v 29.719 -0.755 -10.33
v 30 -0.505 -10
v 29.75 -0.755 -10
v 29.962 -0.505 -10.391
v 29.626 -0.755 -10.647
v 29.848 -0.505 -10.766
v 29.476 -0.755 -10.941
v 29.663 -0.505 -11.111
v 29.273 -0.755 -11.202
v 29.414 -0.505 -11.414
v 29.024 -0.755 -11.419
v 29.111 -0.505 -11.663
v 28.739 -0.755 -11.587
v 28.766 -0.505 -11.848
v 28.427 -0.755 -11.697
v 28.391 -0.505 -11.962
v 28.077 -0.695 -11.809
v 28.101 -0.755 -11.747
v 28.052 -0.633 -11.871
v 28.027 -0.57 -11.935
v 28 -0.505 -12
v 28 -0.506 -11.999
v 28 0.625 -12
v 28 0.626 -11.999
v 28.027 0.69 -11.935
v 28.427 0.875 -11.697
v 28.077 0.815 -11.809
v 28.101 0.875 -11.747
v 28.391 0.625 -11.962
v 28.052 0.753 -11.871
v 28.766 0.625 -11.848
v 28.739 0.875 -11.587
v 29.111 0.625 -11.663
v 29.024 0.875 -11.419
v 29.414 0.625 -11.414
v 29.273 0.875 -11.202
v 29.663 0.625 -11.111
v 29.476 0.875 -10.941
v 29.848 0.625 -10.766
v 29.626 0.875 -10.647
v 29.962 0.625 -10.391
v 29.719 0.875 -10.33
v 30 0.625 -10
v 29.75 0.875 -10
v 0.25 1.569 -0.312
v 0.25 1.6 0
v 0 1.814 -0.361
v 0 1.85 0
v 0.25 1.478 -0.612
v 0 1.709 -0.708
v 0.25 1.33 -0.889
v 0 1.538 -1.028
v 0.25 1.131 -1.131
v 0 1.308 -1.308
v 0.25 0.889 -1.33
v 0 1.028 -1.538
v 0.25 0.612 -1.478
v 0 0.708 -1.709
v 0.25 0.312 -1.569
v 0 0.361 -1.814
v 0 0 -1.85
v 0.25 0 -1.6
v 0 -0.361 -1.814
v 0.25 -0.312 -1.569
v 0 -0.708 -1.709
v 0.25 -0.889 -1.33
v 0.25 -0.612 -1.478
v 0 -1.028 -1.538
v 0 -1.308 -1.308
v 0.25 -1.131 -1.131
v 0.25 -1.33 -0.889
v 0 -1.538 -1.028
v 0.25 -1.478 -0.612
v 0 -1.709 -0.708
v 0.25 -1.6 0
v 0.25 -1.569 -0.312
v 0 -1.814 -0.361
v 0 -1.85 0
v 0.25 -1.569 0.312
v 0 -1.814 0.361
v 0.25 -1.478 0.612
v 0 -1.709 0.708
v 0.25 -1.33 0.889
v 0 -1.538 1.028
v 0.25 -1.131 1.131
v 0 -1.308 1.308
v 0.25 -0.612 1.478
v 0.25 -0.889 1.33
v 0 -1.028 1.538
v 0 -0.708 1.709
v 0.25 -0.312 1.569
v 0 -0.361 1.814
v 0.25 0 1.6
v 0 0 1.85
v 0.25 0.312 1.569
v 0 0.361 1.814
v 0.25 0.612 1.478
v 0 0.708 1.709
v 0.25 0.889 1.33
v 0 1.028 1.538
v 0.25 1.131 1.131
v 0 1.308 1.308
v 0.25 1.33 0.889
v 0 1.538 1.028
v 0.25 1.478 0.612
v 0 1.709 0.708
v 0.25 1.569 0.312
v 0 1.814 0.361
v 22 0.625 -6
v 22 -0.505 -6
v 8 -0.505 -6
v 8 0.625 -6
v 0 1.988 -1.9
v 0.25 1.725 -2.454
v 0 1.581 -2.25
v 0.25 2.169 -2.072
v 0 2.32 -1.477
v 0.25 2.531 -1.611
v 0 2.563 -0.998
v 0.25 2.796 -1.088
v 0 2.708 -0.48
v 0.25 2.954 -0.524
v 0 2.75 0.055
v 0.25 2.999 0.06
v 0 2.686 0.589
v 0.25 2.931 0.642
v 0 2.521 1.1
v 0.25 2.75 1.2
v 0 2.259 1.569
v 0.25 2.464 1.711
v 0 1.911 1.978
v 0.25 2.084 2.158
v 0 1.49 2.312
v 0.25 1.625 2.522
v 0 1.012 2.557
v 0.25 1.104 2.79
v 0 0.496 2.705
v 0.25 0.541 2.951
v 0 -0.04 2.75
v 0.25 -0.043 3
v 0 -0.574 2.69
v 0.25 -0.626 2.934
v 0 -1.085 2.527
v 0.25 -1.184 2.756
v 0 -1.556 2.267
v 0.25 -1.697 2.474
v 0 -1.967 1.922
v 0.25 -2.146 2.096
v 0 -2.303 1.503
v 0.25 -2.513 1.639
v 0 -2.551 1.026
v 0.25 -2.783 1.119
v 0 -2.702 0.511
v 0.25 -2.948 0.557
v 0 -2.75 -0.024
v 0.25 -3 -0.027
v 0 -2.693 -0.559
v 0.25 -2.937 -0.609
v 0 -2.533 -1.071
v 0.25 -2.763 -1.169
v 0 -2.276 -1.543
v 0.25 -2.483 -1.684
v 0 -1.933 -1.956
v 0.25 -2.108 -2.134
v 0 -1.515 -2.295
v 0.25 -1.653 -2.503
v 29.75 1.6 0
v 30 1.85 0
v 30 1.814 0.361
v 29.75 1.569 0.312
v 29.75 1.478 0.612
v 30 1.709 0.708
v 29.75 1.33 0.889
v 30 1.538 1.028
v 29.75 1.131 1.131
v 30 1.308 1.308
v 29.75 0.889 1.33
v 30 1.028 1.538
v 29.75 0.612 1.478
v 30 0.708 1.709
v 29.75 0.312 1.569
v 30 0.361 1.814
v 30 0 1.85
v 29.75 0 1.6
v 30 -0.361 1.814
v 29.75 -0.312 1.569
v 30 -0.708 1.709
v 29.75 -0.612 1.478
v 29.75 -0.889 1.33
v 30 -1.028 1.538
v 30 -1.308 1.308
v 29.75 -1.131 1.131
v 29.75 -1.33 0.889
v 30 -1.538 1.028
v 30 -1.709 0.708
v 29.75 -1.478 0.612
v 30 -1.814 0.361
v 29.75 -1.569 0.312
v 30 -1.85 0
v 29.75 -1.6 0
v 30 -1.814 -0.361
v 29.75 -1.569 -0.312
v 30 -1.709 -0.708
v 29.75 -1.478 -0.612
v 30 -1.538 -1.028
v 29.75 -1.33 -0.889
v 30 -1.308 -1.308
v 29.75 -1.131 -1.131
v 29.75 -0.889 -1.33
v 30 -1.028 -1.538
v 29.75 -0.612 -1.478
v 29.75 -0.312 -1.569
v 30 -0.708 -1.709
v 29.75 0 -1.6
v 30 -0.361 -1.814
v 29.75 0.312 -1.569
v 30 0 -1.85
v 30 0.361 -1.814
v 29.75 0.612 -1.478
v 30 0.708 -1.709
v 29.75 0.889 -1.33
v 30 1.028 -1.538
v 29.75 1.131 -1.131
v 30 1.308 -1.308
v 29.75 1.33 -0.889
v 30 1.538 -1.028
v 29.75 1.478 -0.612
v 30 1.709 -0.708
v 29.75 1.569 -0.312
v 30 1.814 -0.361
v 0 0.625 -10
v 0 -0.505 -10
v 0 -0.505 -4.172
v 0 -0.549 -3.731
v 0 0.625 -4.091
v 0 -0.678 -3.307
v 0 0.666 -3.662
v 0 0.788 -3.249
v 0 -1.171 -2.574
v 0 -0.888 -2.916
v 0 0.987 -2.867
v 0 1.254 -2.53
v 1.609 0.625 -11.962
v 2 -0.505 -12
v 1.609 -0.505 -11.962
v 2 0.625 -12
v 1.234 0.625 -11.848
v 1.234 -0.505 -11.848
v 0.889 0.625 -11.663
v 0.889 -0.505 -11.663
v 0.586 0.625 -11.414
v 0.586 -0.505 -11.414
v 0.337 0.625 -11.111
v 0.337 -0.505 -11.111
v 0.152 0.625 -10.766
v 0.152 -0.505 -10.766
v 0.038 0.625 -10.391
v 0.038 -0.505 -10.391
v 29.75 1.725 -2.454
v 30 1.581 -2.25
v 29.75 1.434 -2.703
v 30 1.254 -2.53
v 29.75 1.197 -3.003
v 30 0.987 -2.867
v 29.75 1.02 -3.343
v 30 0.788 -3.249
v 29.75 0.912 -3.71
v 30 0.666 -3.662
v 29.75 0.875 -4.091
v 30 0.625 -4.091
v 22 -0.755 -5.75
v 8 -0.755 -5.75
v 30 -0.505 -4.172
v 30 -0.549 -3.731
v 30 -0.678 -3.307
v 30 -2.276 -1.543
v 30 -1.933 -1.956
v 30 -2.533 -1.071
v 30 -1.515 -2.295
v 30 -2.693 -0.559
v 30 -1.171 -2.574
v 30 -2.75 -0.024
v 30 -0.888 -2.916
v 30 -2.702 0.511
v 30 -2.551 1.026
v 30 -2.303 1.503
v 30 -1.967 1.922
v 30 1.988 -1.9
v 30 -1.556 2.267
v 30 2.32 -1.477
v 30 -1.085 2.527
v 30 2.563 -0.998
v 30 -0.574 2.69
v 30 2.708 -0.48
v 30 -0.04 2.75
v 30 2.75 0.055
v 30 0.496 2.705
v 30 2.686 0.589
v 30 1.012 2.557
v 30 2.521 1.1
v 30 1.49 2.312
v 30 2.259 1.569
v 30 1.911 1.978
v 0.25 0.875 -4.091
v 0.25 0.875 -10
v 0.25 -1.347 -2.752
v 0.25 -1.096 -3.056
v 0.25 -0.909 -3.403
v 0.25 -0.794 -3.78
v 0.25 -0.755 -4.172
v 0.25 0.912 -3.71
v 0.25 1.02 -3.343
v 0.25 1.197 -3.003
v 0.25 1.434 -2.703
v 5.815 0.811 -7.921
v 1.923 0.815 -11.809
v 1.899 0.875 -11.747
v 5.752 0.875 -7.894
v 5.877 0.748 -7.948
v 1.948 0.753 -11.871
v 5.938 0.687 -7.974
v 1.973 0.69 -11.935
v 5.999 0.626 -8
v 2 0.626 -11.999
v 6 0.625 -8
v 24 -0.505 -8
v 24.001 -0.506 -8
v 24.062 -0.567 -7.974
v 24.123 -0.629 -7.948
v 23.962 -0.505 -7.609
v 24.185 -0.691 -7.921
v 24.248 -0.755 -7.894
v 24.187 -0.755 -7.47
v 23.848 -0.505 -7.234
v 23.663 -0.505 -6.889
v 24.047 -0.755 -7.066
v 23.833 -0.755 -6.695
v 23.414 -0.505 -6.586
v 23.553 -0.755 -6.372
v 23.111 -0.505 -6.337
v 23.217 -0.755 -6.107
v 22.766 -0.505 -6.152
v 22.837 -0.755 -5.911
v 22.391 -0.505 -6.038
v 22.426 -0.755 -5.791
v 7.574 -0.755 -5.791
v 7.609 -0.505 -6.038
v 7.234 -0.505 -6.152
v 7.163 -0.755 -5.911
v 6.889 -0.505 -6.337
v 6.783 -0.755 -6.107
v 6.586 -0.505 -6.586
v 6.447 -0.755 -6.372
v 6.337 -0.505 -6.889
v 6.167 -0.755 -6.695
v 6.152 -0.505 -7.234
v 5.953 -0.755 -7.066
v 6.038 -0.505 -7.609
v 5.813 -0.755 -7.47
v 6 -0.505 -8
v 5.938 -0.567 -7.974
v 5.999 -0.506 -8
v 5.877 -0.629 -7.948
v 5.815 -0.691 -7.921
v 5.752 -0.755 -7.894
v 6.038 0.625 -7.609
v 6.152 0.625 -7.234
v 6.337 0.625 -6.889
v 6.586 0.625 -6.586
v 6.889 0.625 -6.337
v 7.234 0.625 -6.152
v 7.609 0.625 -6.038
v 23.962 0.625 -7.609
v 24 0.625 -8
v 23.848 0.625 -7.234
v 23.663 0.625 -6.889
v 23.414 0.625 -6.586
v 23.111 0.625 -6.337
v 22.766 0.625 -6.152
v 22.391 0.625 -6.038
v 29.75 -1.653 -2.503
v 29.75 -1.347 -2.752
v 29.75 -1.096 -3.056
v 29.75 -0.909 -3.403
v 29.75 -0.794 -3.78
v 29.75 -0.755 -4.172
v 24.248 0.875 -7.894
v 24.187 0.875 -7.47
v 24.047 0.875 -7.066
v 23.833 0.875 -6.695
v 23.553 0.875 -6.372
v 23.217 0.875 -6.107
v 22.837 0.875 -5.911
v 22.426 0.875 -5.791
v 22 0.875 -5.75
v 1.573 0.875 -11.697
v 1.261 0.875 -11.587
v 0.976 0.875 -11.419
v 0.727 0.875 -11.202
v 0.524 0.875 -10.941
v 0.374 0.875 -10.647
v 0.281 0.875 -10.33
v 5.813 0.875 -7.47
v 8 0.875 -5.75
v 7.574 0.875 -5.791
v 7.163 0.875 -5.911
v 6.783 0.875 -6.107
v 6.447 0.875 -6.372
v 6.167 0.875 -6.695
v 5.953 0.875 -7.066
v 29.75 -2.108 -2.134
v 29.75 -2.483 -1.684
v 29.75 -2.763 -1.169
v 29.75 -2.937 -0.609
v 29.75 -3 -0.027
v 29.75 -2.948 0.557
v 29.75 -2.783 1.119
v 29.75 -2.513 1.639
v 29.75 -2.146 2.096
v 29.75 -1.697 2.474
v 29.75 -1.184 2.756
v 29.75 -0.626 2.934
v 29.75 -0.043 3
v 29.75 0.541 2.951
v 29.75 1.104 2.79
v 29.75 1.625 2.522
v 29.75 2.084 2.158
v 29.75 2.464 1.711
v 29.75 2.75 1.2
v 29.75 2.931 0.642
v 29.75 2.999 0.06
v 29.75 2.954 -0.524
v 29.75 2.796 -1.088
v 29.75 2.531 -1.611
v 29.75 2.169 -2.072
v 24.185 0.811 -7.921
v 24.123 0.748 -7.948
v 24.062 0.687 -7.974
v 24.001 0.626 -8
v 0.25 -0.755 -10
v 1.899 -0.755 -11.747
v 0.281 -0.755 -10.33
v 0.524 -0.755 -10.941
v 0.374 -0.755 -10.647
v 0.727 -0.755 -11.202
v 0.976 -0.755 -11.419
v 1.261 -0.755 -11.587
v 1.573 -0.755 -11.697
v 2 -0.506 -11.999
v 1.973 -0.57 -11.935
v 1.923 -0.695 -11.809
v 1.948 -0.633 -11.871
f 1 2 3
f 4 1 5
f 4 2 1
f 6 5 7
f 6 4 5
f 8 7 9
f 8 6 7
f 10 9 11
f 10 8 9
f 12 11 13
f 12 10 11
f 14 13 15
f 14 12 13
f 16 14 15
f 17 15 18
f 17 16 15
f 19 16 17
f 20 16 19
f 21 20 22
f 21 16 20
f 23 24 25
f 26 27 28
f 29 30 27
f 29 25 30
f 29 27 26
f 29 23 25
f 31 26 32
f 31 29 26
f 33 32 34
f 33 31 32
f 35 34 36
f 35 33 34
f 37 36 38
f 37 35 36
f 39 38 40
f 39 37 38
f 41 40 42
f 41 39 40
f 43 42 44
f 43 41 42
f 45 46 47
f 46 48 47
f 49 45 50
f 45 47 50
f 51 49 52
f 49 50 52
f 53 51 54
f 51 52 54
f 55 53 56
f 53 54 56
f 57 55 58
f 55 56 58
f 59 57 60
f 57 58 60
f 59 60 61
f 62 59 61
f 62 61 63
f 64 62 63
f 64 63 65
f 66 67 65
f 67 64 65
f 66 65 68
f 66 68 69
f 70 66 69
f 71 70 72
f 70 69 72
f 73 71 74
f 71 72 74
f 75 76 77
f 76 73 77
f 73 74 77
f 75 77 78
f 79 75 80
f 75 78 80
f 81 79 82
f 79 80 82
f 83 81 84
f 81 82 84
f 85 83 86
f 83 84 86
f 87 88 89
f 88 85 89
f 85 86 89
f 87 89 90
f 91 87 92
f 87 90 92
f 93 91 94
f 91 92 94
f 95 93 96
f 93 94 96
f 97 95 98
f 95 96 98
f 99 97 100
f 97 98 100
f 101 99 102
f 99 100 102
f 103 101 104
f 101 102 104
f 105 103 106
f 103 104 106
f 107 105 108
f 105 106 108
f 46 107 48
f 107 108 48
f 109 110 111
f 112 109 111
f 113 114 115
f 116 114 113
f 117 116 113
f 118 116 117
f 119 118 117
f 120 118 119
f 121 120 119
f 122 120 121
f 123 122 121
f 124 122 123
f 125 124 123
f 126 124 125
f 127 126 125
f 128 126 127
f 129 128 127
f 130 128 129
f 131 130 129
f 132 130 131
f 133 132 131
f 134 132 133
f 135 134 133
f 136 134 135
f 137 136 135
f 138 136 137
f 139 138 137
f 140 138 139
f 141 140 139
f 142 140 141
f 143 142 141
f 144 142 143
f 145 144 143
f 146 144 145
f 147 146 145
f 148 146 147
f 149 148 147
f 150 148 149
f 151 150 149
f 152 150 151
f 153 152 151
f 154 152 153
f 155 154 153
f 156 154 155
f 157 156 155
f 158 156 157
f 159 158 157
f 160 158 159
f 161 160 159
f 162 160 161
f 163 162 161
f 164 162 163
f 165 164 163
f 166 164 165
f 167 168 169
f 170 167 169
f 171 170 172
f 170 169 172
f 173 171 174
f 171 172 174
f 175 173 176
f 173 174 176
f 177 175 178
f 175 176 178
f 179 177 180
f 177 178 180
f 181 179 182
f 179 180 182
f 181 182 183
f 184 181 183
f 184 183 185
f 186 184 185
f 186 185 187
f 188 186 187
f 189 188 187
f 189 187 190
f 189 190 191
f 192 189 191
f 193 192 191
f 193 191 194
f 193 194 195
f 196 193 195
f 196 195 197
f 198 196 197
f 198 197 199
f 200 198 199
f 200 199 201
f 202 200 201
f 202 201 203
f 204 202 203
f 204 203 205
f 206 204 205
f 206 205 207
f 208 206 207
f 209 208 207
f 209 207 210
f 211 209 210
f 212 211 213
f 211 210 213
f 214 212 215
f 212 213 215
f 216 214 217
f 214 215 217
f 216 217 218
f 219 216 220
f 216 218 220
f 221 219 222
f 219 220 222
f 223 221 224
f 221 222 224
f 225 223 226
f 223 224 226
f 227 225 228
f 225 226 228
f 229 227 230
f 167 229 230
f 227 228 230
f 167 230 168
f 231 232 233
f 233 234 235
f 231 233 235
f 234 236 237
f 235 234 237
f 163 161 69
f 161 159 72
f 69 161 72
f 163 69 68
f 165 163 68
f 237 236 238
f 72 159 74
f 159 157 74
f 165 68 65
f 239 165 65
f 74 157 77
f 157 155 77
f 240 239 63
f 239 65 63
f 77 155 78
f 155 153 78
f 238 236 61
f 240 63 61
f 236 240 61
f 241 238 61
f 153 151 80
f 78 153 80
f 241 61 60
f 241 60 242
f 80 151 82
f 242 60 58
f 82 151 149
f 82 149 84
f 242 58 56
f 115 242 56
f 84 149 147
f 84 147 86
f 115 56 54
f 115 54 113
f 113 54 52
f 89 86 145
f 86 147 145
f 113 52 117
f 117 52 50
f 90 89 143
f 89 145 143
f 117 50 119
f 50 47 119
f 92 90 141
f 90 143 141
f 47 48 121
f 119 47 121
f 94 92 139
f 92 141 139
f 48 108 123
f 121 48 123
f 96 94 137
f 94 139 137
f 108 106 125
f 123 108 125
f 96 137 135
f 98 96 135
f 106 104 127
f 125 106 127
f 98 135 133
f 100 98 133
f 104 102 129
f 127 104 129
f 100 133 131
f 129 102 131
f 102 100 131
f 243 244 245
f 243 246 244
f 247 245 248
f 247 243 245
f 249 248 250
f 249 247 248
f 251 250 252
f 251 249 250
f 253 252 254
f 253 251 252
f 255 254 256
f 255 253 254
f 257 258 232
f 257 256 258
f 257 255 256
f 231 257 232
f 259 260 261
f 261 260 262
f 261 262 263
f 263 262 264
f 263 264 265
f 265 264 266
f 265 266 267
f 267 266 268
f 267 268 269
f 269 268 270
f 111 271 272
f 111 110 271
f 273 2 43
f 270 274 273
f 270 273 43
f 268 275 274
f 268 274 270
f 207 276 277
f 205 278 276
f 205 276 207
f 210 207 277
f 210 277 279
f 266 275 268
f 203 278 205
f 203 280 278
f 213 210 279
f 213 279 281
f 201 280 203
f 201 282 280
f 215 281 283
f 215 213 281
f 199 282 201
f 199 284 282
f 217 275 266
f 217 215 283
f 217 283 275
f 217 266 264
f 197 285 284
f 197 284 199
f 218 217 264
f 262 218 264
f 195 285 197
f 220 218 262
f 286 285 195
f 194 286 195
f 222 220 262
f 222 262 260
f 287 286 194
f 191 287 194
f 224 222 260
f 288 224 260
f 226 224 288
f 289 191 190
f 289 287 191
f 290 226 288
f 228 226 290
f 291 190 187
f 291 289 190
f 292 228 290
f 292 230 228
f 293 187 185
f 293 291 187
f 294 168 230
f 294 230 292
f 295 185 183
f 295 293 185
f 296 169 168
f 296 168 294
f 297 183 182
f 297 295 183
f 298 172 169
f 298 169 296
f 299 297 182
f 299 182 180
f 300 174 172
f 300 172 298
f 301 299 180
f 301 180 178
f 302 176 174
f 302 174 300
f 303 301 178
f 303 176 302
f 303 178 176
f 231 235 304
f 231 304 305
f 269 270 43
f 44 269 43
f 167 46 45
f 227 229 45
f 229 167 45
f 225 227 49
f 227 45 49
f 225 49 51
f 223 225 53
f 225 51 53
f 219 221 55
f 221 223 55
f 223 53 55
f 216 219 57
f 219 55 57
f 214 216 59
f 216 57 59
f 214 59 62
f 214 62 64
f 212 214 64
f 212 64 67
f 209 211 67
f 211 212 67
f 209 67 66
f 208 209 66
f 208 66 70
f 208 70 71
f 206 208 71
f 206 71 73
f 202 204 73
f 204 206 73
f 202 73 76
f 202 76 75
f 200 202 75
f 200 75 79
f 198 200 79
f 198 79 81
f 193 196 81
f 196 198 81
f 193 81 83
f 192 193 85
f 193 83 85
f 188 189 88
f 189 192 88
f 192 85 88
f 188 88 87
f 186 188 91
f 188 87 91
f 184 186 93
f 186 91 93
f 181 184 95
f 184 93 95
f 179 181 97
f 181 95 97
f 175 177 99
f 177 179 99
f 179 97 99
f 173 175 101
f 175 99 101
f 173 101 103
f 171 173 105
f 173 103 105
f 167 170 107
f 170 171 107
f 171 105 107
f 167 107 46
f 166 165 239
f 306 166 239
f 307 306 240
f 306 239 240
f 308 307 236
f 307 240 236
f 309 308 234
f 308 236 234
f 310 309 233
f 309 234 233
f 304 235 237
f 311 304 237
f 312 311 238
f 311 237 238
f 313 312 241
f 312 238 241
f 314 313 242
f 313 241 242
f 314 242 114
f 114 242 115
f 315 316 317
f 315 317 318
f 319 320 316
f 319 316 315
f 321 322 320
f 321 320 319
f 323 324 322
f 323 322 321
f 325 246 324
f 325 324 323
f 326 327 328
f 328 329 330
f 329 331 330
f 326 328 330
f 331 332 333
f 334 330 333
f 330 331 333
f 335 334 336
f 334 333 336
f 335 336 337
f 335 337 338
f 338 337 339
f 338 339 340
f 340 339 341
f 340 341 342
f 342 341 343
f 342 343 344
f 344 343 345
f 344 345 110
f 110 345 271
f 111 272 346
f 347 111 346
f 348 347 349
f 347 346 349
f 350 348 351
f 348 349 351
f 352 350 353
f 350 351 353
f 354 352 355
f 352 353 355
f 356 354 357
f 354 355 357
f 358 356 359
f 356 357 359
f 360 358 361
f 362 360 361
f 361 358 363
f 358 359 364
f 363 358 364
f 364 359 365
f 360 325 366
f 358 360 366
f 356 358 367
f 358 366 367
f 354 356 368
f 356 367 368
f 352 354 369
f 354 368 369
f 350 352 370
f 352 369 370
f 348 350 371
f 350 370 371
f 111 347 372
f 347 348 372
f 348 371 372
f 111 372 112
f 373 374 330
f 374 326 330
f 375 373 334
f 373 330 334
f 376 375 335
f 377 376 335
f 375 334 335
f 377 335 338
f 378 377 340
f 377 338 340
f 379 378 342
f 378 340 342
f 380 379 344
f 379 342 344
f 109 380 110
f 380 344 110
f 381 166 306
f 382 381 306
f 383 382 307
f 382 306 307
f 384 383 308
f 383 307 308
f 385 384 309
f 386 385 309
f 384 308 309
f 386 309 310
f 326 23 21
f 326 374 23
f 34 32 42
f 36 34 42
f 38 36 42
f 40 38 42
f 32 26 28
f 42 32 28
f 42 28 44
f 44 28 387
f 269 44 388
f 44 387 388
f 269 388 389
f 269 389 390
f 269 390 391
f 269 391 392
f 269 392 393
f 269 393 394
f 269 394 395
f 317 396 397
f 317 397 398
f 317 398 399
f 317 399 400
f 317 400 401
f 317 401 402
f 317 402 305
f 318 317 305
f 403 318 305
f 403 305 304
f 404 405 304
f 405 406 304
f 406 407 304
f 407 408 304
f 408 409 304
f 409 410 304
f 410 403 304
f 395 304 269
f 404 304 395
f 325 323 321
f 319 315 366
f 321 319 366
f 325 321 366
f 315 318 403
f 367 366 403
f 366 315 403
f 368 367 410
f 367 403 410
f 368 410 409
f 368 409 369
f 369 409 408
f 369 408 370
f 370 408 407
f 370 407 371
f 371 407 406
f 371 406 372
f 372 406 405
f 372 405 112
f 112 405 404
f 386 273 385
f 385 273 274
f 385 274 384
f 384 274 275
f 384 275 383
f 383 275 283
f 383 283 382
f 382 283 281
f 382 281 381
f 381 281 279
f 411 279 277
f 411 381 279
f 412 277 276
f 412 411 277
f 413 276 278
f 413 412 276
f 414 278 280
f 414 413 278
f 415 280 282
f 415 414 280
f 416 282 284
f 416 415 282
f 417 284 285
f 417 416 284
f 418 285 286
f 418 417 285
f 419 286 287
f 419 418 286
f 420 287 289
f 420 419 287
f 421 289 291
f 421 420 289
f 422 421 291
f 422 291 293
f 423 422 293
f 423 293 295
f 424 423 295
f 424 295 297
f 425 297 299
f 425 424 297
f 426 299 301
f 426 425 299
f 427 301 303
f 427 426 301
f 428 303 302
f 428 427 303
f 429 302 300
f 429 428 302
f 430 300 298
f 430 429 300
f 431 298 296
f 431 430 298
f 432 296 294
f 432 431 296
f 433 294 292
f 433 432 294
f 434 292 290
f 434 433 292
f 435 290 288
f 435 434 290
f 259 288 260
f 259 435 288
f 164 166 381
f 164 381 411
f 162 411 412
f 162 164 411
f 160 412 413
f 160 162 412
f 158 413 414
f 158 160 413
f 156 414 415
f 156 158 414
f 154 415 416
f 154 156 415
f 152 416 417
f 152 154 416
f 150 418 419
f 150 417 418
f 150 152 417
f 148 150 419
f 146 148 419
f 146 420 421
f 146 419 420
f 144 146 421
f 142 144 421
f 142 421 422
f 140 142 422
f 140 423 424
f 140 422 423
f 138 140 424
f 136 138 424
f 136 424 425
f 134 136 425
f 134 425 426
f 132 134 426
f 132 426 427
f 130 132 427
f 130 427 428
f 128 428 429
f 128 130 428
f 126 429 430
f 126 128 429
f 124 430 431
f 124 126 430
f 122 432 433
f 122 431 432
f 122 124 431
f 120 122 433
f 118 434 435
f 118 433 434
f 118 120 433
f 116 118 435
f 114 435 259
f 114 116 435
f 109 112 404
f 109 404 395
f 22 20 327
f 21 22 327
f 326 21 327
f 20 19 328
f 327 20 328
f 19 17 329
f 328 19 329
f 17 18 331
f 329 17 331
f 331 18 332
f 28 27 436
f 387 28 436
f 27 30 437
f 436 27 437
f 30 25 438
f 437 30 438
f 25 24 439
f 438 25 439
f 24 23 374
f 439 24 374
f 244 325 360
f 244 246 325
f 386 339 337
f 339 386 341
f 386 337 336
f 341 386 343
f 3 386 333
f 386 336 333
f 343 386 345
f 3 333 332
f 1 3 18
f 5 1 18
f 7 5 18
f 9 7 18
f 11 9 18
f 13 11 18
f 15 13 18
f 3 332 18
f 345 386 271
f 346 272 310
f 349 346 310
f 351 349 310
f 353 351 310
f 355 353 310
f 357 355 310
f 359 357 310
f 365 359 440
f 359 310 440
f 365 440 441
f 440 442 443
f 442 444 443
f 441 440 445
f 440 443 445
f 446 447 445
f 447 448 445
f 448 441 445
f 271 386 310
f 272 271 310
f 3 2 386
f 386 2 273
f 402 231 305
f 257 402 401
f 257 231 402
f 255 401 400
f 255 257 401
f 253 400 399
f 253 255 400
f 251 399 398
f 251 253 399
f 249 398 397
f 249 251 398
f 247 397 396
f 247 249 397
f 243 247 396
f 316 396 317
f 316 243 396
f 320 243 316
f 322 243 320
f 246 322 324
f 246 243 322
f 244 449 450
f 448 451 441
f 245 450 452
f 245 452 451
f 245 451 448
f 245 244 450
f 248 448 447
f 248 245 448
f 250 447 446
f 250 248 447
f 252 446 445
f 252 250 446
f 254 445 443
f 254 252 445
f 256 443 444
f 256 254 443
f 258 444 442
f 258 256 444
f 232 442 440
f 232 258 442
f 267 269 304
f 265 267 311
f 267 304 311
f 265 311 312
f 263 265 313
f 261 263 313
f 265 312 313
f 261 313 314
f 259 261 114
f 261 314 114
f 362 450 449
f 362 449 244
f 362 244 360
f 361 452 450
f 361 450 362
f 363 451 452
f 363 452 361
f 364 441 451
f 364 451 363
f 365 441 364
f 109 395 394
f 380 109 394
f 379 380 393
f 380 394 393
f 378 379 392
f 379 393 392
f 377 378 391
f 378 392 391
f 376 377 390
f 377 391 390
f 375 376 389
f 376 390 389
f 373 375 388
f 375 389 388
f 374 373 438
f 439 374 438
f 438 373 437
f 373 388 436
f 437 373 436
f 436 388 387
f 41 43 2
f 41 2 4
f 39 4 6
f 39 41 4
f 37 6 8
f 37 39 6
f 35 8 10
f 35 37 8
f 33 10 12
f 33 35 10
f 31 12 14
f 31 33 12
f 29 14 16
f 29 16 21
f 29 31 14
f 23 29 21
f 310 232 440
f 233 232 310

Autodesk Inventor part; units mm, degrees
ref_plane "YZ Plane" through (0, 0, 0) normal (1, 0, 0) x (0, 1, 0)
ref_plane "XZ Plane" through (0, 0, 0) normal (0, 1, 0) x (-1, 0, 0)
ref_plane "XY Plane" through (0, 0, 0) normal (0, 0, 1) x (1, 0, 0)
sketch "Sketch3" plane through (0, 0, 0) normal (1, 0, 0) x (0, 1, 0)
  circle A0 centre (0, 0) radius 1.6
  arc A1 (1.725, -2.4545) -> (-1.6531, -2.5034) centre (0, 0) ccw
  line L0 (-0.7552, -4.1724) -> (-0.7552, -12)
  line L1 (-0.7552, -12) -> (0.875, -12)
  line L2 (0.875, -12) -> (0.875, -4.0908)
  arc A2 (1.725, -2.4545) -> (0.875, -4.0908) centre (2.875, -4.0908) ccw
  arc A3 (-0.7552, -4.1724) -> (-1.6531, -2.5034) centre (-2.7552, -4.1724) ccw
  dimension "d4" = 3.2
  dimension "d5" = 6
  dimension "d7" = 2
  dimension "d33" = 12
extrude "Extrusion2" add sketch "Sketch3" along normal blind 30
sketch "Sketch5" plane through (0, 0.875, -4.0908) normal (0, 1, 0) x (1, 0, 0)
  line L0 (0, 7.9092) -> (30, 7.9092) projected
  line L1 (6, 7.9092) -> (24, 7.9092)
  line L2 (24, 7.9092) -> (24, 1.9092)
  line L3 (24, 1.9092) -> (6, 1.9092)
  line L4 (6, 1.9092) -> (6, 7.9092)
  line L5 (0, 7.9092) -> (0, 0) projected
  point P0 (0, -4.0908)
  dimension "d18" = 6
  dimension "d19" = 30
  dimension "d20" = 6
  dimension "d21" = 18
extrude "Extrusion3" cut sketch "Sketch5" along normal blind 0.5 and the other way blind 2
chamfer "Chamfer3" distance 4 angle 45 2 edges at (6, 0.0599, -12) (24, 0.0599, -12)
fillet "Fillet1" radius 2 4 edges at (30, 0.0599, -12) (0, 0.0599, -12) (24, 0.0599, -6) (6, 0.0599, -6)
chamfer "Chamfer2" distance 0.25 angle 45 28 edges at (6, 0.875, -7.9998) (6.5856, 0.875, -6.5856) (23.4144, 0.875, -6.5856) (24, 0.875, -7.9998) (29.4144, 0.875, -11.4144) (30, 0.875, -7.0456) (30, 1.1002, -3.1688) (30, -0.0435, 2.9997) (30, -0.9939, -3.2248) (30, -0.7552, -7.0865) (29.4144, -0.7552, -11.4144) (23.4144, -0.7552, -6.5856) (24, -0.7552, -7.9997) (6, -0.7552, -7.9998) (6.5856, -0.7552, -6.5856) (0.5856, -0.7552, -11.4144) (0, -0.7552, -7.0865) (0, -0.9939, -3.2248) (0, -0.0435, 2.9997) (0, 1.1002, -3.1688) (0, 0.875, -7.0456) (0.5856, 0.875, -11.4144) (30, -1.6, 0) (0, -1.6, 0) (26, 0.875, -10) (26, -0.7552, -10) (4, 0.875, -10) (4, -0.7552, -10)
equation "\"d20\" = -0.5 * d21 + 0.5 * d19"
properties part number "CoinLockUpperRow2"
